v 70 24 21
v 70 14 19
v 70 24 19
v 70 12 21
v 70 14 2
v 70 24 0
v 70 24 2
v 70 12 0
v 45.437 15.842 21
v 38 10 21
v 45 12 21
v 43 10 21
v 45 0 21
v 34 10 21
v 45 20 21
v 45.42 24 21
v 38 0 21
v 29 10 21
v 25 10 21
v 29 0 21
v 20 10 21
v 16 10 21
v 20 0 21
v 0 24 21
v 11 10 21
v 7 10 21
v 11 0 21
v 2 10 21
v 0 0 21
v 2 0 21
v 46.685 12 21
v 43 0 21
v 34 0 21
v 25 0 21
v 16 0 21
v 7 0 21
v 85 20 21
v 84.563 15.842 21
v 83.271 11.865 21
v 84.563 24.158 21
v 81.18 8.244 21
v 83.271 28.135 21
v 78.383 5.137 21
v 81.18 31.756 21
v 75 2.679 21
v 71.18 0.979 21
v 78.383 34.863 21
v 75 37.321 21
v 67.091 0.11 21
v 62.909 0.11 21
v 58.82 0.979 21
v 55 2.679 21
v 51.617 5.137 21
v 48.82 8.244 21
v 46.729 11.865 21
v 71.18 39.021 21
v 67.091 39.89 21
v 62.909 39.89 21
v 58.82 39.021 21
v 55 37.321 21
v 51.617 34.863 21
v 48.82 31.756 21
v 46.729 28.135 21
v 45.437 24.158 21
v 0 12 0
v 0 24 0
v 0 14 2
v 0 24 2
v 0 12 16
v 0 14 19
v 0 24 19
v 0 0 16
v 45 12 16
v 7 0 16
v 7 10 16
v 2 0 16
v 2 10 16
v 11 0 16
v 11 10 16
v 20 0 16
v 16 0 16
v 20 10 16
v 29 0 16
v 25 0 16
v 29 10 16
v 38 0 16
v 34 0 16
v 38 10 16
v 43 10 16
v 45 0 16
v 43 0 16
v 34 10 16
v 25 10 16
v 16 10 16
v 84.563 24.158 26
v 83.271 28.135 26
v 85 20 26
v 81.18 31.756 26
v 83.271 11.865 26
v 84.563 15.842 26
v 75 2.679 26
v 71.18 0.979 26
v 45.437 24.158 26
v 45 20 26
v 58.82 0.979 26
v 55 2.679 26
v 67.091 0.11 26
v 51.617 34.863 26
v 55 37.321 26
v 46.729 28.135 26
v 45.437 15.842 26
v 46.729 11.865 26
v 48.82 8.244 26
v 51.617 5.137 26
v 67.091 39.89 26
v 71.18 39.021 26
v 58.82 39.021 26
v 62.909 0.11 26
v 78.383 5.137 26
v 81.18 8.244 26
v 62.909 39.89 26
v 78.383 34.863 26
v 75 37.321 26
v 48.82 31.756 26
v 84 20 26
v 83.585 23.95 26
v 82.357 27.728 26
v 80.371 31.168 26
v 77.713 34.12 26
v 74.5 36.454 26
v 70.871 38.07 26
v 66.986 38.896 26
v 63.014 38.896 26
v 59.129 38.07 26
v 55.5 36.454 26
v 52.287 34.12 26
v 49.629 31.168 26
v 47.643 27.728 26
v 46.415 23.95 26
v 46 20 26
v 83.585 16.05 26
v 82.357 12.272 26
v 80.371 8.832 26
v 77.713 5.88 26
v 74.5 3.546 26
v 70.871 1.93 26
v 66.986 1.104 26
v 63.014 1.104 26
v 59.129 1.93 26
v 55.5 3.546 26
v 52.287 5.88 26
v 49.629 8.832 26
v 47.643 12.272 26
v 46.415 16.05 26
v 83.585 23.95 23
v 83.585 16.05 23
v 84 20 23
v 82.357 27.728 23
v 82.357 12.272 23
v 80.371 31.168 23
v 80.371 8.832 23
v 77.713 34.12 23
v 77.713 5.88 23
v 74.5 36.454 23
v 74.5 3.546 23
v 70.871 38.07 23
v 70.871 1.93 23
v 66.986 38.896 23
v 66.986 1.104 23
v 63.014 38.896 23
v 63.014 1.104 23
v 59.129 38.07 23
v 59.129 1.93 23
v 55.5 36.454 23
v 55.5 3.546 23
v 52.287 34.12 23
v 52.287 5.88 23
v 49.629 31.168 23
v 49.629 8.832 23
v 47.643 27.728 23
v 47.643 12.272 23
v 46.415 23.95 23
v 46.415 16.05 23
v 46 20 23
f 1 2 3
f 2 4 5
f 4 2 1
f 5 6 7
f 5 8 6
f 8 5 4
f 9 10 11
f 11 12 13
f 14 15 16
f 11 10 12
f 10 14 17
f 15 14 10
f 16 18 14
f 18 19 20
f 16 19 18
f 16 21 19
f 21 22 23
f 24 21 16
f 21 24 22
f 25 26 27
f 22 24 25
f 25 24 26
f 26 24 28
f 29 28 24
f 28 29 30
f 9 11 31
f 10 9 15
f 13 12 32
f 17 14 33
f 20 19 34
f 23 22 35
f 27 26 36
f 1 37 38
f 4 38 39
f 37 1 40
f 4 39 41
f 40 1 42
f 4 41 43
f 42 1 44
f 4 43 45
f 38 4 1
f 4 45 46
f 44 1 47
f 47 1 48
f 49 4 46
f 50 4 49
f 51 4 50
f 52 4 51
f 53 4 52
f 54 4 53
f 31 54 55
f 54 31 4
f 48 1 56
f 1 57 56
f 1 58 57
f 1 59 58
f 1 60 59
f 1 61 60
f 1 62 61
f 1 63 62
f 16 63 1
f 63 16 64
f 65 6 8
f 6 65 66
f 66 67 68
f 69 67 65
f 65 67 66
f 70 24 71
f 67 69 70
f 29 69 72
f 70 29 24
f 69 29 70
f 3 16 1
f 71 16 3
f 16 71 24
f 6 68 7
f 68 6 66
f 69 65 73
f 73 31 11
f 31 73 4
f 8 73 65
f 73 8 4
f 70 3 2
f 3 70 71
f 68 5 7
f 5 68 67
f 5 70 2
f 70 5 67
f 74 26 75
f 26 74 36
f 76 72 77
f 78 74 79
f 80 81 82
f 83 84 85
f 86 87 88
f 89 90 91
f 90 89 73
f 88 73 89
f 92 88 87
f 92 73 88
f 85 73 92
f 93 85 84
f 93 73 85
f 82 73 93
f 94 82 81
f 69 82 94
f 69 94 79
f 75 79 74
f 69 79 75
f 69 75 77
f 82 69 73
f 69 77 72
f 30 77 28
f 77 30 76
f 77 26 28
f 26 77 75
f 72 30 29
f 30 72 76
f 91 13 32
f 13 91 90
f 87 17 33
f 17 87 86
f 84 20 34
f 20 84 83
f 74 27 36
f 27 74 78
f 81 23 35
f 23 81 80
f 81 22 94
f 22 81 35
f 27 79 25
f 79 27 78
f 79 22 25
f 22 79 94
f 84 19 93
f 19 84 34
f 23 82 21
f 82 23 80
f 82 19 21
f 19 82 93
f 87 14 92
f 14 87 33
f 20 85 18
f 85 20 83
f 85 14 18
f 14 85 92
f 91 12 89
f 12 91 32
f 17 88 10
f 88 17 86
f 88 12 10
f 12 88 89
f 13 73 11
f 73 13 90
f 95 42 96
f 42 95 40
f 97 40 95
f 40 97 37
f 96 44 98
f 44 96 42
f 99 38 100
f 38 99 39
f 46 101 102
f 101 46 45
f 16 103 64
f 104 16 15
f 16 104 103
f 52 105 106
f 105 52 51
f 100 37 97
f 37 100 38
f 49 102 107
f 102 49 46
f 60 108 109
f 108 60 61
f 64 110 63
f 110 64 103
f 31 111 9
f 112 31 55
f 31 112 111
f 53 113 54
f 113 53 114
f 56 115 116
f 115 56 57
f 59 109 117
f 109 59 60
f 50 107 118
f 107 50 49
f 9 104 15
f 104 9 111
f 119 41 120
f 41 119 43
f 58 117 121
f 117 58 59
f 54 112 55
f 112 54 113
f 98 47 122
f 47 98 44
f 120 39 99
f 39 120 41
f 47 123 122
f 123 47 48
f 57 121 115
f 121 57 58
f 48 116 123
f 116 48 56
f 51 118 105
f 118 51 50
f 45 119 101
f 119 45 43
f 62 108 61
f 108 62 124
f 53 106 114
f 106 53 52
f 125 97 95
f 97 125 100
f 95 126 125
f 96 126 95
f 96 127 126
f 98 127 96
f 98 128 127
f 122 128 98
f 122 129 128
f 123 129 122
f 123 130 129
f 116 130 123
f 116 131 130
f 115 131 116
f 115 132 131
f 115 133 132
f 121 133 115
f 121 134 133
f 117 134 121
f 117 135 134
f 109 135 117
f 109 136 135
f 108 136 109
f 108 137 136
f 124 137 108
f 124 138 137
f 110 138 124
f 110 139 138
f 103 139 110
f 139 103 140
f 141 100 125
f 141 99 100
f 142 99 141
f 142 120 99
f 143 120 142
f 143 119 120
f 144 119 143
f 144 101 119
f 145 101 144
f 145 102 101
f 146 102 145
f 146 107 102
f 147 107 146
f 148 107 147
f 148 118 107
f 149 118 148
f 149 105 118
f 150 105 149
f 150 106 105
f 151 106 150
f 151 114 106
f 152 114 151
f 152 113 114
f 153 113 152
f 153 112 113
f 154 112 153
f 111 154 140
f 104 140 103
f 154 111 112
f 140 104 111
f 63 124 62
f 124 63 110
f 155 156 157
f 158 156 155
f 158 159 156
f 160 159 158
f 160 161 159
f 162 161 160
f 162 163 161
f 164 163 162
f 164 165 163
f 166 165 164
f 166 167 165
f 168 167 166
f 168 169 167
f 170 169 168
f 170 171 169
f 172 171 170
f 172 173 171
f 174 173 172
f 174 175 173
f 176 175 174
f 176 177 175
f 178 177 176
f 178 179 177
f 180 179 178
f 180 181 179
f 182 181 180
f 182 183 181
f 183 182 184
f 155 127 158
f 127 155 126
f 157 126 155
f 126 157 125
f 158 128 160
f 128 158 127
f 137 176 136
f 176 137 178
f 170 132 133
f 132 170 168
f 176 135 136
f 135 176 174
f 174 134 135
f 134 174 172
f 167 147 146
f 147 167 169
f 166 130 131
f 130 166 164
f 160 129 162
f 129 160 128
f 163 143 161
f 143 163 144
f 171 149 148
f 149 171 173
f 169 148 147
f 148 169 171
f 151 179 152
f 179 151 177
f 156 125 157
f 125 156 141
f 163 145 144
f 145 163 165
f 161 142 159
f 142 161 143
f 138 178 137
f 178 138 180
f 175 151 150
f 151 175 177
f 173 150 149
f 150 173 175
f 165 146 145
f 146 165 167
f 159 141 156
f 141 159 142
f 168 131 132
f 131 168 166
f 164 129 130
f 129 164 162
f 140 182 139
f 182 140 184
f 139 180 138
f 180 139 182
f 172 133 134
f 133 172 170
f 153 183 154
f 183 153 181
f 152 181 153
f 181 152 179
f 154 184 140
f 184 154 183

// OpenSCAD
// file: ../../utils.scad
function CENTER(parentCoordinate, childCoordinate) = 
    parentCoordinate / 2 - childCoordinate / 2;

function DIAGNAL(a, b) = 
    sqrt(pow(a, 2) + pow(b, 2));
// main file
use <./../../utils.scad>

cableHolderHeight=5;
cableHolderWidth=12;
cableWidth=5;
cableDepth=cableHolderWidth-2;
thickness=2;
between=4;
cables=5;

width=70;
clipHeight=17;
clipWidth=10;

watchHolderHeight=3;
watchChargerDiamater=38;
watchGap=30;
chargerGap=15;

translate([0,cableHolderWidth,0])tableClip();
translate([0,0,clipHeight+thickness*2-cableHolderHeight]) cableHolder();
translate([thickness*2+between*(cables-1)+cableWidth*cables,0,clipHeight+thickness*2]) watchHolder();

module tableClip() {
    difference() {
        cube([width,clipWidth+thickness,clipHeight+thickness*2]);
        translate([0,thickness,thickness])cube([width,clipWidth,clipHeight]);
    }
}

module cableHolder() {
    difference() {
        cube([thickness*2+between*(cables-1)+cableWidth*cables,cableHolderWidth,cableHolderHeight]);

        for (i=[0:cables-1]) {
            translate([thickness+between*i+cableWidth*i,0,0]) #cube([cableWidth,cableDepth,cableHolderHeight]);
        }
    }
}

module watchHolder() {
    difference() {
        translate([(watchChargerDiamater+thickness)/2,(watchChargerDiamater+thickness)/2,0]) cylinder(watchHolderHeight+thickness, d=watchChargerDiamater+thickness);
        #translate([watchChargerDiamater/2+thickness/2,watchChargerDiamater/2+thickness/2,thickness]) cylinder(watchHolderHeight, d=watchChargerDiamater);
    }
}
